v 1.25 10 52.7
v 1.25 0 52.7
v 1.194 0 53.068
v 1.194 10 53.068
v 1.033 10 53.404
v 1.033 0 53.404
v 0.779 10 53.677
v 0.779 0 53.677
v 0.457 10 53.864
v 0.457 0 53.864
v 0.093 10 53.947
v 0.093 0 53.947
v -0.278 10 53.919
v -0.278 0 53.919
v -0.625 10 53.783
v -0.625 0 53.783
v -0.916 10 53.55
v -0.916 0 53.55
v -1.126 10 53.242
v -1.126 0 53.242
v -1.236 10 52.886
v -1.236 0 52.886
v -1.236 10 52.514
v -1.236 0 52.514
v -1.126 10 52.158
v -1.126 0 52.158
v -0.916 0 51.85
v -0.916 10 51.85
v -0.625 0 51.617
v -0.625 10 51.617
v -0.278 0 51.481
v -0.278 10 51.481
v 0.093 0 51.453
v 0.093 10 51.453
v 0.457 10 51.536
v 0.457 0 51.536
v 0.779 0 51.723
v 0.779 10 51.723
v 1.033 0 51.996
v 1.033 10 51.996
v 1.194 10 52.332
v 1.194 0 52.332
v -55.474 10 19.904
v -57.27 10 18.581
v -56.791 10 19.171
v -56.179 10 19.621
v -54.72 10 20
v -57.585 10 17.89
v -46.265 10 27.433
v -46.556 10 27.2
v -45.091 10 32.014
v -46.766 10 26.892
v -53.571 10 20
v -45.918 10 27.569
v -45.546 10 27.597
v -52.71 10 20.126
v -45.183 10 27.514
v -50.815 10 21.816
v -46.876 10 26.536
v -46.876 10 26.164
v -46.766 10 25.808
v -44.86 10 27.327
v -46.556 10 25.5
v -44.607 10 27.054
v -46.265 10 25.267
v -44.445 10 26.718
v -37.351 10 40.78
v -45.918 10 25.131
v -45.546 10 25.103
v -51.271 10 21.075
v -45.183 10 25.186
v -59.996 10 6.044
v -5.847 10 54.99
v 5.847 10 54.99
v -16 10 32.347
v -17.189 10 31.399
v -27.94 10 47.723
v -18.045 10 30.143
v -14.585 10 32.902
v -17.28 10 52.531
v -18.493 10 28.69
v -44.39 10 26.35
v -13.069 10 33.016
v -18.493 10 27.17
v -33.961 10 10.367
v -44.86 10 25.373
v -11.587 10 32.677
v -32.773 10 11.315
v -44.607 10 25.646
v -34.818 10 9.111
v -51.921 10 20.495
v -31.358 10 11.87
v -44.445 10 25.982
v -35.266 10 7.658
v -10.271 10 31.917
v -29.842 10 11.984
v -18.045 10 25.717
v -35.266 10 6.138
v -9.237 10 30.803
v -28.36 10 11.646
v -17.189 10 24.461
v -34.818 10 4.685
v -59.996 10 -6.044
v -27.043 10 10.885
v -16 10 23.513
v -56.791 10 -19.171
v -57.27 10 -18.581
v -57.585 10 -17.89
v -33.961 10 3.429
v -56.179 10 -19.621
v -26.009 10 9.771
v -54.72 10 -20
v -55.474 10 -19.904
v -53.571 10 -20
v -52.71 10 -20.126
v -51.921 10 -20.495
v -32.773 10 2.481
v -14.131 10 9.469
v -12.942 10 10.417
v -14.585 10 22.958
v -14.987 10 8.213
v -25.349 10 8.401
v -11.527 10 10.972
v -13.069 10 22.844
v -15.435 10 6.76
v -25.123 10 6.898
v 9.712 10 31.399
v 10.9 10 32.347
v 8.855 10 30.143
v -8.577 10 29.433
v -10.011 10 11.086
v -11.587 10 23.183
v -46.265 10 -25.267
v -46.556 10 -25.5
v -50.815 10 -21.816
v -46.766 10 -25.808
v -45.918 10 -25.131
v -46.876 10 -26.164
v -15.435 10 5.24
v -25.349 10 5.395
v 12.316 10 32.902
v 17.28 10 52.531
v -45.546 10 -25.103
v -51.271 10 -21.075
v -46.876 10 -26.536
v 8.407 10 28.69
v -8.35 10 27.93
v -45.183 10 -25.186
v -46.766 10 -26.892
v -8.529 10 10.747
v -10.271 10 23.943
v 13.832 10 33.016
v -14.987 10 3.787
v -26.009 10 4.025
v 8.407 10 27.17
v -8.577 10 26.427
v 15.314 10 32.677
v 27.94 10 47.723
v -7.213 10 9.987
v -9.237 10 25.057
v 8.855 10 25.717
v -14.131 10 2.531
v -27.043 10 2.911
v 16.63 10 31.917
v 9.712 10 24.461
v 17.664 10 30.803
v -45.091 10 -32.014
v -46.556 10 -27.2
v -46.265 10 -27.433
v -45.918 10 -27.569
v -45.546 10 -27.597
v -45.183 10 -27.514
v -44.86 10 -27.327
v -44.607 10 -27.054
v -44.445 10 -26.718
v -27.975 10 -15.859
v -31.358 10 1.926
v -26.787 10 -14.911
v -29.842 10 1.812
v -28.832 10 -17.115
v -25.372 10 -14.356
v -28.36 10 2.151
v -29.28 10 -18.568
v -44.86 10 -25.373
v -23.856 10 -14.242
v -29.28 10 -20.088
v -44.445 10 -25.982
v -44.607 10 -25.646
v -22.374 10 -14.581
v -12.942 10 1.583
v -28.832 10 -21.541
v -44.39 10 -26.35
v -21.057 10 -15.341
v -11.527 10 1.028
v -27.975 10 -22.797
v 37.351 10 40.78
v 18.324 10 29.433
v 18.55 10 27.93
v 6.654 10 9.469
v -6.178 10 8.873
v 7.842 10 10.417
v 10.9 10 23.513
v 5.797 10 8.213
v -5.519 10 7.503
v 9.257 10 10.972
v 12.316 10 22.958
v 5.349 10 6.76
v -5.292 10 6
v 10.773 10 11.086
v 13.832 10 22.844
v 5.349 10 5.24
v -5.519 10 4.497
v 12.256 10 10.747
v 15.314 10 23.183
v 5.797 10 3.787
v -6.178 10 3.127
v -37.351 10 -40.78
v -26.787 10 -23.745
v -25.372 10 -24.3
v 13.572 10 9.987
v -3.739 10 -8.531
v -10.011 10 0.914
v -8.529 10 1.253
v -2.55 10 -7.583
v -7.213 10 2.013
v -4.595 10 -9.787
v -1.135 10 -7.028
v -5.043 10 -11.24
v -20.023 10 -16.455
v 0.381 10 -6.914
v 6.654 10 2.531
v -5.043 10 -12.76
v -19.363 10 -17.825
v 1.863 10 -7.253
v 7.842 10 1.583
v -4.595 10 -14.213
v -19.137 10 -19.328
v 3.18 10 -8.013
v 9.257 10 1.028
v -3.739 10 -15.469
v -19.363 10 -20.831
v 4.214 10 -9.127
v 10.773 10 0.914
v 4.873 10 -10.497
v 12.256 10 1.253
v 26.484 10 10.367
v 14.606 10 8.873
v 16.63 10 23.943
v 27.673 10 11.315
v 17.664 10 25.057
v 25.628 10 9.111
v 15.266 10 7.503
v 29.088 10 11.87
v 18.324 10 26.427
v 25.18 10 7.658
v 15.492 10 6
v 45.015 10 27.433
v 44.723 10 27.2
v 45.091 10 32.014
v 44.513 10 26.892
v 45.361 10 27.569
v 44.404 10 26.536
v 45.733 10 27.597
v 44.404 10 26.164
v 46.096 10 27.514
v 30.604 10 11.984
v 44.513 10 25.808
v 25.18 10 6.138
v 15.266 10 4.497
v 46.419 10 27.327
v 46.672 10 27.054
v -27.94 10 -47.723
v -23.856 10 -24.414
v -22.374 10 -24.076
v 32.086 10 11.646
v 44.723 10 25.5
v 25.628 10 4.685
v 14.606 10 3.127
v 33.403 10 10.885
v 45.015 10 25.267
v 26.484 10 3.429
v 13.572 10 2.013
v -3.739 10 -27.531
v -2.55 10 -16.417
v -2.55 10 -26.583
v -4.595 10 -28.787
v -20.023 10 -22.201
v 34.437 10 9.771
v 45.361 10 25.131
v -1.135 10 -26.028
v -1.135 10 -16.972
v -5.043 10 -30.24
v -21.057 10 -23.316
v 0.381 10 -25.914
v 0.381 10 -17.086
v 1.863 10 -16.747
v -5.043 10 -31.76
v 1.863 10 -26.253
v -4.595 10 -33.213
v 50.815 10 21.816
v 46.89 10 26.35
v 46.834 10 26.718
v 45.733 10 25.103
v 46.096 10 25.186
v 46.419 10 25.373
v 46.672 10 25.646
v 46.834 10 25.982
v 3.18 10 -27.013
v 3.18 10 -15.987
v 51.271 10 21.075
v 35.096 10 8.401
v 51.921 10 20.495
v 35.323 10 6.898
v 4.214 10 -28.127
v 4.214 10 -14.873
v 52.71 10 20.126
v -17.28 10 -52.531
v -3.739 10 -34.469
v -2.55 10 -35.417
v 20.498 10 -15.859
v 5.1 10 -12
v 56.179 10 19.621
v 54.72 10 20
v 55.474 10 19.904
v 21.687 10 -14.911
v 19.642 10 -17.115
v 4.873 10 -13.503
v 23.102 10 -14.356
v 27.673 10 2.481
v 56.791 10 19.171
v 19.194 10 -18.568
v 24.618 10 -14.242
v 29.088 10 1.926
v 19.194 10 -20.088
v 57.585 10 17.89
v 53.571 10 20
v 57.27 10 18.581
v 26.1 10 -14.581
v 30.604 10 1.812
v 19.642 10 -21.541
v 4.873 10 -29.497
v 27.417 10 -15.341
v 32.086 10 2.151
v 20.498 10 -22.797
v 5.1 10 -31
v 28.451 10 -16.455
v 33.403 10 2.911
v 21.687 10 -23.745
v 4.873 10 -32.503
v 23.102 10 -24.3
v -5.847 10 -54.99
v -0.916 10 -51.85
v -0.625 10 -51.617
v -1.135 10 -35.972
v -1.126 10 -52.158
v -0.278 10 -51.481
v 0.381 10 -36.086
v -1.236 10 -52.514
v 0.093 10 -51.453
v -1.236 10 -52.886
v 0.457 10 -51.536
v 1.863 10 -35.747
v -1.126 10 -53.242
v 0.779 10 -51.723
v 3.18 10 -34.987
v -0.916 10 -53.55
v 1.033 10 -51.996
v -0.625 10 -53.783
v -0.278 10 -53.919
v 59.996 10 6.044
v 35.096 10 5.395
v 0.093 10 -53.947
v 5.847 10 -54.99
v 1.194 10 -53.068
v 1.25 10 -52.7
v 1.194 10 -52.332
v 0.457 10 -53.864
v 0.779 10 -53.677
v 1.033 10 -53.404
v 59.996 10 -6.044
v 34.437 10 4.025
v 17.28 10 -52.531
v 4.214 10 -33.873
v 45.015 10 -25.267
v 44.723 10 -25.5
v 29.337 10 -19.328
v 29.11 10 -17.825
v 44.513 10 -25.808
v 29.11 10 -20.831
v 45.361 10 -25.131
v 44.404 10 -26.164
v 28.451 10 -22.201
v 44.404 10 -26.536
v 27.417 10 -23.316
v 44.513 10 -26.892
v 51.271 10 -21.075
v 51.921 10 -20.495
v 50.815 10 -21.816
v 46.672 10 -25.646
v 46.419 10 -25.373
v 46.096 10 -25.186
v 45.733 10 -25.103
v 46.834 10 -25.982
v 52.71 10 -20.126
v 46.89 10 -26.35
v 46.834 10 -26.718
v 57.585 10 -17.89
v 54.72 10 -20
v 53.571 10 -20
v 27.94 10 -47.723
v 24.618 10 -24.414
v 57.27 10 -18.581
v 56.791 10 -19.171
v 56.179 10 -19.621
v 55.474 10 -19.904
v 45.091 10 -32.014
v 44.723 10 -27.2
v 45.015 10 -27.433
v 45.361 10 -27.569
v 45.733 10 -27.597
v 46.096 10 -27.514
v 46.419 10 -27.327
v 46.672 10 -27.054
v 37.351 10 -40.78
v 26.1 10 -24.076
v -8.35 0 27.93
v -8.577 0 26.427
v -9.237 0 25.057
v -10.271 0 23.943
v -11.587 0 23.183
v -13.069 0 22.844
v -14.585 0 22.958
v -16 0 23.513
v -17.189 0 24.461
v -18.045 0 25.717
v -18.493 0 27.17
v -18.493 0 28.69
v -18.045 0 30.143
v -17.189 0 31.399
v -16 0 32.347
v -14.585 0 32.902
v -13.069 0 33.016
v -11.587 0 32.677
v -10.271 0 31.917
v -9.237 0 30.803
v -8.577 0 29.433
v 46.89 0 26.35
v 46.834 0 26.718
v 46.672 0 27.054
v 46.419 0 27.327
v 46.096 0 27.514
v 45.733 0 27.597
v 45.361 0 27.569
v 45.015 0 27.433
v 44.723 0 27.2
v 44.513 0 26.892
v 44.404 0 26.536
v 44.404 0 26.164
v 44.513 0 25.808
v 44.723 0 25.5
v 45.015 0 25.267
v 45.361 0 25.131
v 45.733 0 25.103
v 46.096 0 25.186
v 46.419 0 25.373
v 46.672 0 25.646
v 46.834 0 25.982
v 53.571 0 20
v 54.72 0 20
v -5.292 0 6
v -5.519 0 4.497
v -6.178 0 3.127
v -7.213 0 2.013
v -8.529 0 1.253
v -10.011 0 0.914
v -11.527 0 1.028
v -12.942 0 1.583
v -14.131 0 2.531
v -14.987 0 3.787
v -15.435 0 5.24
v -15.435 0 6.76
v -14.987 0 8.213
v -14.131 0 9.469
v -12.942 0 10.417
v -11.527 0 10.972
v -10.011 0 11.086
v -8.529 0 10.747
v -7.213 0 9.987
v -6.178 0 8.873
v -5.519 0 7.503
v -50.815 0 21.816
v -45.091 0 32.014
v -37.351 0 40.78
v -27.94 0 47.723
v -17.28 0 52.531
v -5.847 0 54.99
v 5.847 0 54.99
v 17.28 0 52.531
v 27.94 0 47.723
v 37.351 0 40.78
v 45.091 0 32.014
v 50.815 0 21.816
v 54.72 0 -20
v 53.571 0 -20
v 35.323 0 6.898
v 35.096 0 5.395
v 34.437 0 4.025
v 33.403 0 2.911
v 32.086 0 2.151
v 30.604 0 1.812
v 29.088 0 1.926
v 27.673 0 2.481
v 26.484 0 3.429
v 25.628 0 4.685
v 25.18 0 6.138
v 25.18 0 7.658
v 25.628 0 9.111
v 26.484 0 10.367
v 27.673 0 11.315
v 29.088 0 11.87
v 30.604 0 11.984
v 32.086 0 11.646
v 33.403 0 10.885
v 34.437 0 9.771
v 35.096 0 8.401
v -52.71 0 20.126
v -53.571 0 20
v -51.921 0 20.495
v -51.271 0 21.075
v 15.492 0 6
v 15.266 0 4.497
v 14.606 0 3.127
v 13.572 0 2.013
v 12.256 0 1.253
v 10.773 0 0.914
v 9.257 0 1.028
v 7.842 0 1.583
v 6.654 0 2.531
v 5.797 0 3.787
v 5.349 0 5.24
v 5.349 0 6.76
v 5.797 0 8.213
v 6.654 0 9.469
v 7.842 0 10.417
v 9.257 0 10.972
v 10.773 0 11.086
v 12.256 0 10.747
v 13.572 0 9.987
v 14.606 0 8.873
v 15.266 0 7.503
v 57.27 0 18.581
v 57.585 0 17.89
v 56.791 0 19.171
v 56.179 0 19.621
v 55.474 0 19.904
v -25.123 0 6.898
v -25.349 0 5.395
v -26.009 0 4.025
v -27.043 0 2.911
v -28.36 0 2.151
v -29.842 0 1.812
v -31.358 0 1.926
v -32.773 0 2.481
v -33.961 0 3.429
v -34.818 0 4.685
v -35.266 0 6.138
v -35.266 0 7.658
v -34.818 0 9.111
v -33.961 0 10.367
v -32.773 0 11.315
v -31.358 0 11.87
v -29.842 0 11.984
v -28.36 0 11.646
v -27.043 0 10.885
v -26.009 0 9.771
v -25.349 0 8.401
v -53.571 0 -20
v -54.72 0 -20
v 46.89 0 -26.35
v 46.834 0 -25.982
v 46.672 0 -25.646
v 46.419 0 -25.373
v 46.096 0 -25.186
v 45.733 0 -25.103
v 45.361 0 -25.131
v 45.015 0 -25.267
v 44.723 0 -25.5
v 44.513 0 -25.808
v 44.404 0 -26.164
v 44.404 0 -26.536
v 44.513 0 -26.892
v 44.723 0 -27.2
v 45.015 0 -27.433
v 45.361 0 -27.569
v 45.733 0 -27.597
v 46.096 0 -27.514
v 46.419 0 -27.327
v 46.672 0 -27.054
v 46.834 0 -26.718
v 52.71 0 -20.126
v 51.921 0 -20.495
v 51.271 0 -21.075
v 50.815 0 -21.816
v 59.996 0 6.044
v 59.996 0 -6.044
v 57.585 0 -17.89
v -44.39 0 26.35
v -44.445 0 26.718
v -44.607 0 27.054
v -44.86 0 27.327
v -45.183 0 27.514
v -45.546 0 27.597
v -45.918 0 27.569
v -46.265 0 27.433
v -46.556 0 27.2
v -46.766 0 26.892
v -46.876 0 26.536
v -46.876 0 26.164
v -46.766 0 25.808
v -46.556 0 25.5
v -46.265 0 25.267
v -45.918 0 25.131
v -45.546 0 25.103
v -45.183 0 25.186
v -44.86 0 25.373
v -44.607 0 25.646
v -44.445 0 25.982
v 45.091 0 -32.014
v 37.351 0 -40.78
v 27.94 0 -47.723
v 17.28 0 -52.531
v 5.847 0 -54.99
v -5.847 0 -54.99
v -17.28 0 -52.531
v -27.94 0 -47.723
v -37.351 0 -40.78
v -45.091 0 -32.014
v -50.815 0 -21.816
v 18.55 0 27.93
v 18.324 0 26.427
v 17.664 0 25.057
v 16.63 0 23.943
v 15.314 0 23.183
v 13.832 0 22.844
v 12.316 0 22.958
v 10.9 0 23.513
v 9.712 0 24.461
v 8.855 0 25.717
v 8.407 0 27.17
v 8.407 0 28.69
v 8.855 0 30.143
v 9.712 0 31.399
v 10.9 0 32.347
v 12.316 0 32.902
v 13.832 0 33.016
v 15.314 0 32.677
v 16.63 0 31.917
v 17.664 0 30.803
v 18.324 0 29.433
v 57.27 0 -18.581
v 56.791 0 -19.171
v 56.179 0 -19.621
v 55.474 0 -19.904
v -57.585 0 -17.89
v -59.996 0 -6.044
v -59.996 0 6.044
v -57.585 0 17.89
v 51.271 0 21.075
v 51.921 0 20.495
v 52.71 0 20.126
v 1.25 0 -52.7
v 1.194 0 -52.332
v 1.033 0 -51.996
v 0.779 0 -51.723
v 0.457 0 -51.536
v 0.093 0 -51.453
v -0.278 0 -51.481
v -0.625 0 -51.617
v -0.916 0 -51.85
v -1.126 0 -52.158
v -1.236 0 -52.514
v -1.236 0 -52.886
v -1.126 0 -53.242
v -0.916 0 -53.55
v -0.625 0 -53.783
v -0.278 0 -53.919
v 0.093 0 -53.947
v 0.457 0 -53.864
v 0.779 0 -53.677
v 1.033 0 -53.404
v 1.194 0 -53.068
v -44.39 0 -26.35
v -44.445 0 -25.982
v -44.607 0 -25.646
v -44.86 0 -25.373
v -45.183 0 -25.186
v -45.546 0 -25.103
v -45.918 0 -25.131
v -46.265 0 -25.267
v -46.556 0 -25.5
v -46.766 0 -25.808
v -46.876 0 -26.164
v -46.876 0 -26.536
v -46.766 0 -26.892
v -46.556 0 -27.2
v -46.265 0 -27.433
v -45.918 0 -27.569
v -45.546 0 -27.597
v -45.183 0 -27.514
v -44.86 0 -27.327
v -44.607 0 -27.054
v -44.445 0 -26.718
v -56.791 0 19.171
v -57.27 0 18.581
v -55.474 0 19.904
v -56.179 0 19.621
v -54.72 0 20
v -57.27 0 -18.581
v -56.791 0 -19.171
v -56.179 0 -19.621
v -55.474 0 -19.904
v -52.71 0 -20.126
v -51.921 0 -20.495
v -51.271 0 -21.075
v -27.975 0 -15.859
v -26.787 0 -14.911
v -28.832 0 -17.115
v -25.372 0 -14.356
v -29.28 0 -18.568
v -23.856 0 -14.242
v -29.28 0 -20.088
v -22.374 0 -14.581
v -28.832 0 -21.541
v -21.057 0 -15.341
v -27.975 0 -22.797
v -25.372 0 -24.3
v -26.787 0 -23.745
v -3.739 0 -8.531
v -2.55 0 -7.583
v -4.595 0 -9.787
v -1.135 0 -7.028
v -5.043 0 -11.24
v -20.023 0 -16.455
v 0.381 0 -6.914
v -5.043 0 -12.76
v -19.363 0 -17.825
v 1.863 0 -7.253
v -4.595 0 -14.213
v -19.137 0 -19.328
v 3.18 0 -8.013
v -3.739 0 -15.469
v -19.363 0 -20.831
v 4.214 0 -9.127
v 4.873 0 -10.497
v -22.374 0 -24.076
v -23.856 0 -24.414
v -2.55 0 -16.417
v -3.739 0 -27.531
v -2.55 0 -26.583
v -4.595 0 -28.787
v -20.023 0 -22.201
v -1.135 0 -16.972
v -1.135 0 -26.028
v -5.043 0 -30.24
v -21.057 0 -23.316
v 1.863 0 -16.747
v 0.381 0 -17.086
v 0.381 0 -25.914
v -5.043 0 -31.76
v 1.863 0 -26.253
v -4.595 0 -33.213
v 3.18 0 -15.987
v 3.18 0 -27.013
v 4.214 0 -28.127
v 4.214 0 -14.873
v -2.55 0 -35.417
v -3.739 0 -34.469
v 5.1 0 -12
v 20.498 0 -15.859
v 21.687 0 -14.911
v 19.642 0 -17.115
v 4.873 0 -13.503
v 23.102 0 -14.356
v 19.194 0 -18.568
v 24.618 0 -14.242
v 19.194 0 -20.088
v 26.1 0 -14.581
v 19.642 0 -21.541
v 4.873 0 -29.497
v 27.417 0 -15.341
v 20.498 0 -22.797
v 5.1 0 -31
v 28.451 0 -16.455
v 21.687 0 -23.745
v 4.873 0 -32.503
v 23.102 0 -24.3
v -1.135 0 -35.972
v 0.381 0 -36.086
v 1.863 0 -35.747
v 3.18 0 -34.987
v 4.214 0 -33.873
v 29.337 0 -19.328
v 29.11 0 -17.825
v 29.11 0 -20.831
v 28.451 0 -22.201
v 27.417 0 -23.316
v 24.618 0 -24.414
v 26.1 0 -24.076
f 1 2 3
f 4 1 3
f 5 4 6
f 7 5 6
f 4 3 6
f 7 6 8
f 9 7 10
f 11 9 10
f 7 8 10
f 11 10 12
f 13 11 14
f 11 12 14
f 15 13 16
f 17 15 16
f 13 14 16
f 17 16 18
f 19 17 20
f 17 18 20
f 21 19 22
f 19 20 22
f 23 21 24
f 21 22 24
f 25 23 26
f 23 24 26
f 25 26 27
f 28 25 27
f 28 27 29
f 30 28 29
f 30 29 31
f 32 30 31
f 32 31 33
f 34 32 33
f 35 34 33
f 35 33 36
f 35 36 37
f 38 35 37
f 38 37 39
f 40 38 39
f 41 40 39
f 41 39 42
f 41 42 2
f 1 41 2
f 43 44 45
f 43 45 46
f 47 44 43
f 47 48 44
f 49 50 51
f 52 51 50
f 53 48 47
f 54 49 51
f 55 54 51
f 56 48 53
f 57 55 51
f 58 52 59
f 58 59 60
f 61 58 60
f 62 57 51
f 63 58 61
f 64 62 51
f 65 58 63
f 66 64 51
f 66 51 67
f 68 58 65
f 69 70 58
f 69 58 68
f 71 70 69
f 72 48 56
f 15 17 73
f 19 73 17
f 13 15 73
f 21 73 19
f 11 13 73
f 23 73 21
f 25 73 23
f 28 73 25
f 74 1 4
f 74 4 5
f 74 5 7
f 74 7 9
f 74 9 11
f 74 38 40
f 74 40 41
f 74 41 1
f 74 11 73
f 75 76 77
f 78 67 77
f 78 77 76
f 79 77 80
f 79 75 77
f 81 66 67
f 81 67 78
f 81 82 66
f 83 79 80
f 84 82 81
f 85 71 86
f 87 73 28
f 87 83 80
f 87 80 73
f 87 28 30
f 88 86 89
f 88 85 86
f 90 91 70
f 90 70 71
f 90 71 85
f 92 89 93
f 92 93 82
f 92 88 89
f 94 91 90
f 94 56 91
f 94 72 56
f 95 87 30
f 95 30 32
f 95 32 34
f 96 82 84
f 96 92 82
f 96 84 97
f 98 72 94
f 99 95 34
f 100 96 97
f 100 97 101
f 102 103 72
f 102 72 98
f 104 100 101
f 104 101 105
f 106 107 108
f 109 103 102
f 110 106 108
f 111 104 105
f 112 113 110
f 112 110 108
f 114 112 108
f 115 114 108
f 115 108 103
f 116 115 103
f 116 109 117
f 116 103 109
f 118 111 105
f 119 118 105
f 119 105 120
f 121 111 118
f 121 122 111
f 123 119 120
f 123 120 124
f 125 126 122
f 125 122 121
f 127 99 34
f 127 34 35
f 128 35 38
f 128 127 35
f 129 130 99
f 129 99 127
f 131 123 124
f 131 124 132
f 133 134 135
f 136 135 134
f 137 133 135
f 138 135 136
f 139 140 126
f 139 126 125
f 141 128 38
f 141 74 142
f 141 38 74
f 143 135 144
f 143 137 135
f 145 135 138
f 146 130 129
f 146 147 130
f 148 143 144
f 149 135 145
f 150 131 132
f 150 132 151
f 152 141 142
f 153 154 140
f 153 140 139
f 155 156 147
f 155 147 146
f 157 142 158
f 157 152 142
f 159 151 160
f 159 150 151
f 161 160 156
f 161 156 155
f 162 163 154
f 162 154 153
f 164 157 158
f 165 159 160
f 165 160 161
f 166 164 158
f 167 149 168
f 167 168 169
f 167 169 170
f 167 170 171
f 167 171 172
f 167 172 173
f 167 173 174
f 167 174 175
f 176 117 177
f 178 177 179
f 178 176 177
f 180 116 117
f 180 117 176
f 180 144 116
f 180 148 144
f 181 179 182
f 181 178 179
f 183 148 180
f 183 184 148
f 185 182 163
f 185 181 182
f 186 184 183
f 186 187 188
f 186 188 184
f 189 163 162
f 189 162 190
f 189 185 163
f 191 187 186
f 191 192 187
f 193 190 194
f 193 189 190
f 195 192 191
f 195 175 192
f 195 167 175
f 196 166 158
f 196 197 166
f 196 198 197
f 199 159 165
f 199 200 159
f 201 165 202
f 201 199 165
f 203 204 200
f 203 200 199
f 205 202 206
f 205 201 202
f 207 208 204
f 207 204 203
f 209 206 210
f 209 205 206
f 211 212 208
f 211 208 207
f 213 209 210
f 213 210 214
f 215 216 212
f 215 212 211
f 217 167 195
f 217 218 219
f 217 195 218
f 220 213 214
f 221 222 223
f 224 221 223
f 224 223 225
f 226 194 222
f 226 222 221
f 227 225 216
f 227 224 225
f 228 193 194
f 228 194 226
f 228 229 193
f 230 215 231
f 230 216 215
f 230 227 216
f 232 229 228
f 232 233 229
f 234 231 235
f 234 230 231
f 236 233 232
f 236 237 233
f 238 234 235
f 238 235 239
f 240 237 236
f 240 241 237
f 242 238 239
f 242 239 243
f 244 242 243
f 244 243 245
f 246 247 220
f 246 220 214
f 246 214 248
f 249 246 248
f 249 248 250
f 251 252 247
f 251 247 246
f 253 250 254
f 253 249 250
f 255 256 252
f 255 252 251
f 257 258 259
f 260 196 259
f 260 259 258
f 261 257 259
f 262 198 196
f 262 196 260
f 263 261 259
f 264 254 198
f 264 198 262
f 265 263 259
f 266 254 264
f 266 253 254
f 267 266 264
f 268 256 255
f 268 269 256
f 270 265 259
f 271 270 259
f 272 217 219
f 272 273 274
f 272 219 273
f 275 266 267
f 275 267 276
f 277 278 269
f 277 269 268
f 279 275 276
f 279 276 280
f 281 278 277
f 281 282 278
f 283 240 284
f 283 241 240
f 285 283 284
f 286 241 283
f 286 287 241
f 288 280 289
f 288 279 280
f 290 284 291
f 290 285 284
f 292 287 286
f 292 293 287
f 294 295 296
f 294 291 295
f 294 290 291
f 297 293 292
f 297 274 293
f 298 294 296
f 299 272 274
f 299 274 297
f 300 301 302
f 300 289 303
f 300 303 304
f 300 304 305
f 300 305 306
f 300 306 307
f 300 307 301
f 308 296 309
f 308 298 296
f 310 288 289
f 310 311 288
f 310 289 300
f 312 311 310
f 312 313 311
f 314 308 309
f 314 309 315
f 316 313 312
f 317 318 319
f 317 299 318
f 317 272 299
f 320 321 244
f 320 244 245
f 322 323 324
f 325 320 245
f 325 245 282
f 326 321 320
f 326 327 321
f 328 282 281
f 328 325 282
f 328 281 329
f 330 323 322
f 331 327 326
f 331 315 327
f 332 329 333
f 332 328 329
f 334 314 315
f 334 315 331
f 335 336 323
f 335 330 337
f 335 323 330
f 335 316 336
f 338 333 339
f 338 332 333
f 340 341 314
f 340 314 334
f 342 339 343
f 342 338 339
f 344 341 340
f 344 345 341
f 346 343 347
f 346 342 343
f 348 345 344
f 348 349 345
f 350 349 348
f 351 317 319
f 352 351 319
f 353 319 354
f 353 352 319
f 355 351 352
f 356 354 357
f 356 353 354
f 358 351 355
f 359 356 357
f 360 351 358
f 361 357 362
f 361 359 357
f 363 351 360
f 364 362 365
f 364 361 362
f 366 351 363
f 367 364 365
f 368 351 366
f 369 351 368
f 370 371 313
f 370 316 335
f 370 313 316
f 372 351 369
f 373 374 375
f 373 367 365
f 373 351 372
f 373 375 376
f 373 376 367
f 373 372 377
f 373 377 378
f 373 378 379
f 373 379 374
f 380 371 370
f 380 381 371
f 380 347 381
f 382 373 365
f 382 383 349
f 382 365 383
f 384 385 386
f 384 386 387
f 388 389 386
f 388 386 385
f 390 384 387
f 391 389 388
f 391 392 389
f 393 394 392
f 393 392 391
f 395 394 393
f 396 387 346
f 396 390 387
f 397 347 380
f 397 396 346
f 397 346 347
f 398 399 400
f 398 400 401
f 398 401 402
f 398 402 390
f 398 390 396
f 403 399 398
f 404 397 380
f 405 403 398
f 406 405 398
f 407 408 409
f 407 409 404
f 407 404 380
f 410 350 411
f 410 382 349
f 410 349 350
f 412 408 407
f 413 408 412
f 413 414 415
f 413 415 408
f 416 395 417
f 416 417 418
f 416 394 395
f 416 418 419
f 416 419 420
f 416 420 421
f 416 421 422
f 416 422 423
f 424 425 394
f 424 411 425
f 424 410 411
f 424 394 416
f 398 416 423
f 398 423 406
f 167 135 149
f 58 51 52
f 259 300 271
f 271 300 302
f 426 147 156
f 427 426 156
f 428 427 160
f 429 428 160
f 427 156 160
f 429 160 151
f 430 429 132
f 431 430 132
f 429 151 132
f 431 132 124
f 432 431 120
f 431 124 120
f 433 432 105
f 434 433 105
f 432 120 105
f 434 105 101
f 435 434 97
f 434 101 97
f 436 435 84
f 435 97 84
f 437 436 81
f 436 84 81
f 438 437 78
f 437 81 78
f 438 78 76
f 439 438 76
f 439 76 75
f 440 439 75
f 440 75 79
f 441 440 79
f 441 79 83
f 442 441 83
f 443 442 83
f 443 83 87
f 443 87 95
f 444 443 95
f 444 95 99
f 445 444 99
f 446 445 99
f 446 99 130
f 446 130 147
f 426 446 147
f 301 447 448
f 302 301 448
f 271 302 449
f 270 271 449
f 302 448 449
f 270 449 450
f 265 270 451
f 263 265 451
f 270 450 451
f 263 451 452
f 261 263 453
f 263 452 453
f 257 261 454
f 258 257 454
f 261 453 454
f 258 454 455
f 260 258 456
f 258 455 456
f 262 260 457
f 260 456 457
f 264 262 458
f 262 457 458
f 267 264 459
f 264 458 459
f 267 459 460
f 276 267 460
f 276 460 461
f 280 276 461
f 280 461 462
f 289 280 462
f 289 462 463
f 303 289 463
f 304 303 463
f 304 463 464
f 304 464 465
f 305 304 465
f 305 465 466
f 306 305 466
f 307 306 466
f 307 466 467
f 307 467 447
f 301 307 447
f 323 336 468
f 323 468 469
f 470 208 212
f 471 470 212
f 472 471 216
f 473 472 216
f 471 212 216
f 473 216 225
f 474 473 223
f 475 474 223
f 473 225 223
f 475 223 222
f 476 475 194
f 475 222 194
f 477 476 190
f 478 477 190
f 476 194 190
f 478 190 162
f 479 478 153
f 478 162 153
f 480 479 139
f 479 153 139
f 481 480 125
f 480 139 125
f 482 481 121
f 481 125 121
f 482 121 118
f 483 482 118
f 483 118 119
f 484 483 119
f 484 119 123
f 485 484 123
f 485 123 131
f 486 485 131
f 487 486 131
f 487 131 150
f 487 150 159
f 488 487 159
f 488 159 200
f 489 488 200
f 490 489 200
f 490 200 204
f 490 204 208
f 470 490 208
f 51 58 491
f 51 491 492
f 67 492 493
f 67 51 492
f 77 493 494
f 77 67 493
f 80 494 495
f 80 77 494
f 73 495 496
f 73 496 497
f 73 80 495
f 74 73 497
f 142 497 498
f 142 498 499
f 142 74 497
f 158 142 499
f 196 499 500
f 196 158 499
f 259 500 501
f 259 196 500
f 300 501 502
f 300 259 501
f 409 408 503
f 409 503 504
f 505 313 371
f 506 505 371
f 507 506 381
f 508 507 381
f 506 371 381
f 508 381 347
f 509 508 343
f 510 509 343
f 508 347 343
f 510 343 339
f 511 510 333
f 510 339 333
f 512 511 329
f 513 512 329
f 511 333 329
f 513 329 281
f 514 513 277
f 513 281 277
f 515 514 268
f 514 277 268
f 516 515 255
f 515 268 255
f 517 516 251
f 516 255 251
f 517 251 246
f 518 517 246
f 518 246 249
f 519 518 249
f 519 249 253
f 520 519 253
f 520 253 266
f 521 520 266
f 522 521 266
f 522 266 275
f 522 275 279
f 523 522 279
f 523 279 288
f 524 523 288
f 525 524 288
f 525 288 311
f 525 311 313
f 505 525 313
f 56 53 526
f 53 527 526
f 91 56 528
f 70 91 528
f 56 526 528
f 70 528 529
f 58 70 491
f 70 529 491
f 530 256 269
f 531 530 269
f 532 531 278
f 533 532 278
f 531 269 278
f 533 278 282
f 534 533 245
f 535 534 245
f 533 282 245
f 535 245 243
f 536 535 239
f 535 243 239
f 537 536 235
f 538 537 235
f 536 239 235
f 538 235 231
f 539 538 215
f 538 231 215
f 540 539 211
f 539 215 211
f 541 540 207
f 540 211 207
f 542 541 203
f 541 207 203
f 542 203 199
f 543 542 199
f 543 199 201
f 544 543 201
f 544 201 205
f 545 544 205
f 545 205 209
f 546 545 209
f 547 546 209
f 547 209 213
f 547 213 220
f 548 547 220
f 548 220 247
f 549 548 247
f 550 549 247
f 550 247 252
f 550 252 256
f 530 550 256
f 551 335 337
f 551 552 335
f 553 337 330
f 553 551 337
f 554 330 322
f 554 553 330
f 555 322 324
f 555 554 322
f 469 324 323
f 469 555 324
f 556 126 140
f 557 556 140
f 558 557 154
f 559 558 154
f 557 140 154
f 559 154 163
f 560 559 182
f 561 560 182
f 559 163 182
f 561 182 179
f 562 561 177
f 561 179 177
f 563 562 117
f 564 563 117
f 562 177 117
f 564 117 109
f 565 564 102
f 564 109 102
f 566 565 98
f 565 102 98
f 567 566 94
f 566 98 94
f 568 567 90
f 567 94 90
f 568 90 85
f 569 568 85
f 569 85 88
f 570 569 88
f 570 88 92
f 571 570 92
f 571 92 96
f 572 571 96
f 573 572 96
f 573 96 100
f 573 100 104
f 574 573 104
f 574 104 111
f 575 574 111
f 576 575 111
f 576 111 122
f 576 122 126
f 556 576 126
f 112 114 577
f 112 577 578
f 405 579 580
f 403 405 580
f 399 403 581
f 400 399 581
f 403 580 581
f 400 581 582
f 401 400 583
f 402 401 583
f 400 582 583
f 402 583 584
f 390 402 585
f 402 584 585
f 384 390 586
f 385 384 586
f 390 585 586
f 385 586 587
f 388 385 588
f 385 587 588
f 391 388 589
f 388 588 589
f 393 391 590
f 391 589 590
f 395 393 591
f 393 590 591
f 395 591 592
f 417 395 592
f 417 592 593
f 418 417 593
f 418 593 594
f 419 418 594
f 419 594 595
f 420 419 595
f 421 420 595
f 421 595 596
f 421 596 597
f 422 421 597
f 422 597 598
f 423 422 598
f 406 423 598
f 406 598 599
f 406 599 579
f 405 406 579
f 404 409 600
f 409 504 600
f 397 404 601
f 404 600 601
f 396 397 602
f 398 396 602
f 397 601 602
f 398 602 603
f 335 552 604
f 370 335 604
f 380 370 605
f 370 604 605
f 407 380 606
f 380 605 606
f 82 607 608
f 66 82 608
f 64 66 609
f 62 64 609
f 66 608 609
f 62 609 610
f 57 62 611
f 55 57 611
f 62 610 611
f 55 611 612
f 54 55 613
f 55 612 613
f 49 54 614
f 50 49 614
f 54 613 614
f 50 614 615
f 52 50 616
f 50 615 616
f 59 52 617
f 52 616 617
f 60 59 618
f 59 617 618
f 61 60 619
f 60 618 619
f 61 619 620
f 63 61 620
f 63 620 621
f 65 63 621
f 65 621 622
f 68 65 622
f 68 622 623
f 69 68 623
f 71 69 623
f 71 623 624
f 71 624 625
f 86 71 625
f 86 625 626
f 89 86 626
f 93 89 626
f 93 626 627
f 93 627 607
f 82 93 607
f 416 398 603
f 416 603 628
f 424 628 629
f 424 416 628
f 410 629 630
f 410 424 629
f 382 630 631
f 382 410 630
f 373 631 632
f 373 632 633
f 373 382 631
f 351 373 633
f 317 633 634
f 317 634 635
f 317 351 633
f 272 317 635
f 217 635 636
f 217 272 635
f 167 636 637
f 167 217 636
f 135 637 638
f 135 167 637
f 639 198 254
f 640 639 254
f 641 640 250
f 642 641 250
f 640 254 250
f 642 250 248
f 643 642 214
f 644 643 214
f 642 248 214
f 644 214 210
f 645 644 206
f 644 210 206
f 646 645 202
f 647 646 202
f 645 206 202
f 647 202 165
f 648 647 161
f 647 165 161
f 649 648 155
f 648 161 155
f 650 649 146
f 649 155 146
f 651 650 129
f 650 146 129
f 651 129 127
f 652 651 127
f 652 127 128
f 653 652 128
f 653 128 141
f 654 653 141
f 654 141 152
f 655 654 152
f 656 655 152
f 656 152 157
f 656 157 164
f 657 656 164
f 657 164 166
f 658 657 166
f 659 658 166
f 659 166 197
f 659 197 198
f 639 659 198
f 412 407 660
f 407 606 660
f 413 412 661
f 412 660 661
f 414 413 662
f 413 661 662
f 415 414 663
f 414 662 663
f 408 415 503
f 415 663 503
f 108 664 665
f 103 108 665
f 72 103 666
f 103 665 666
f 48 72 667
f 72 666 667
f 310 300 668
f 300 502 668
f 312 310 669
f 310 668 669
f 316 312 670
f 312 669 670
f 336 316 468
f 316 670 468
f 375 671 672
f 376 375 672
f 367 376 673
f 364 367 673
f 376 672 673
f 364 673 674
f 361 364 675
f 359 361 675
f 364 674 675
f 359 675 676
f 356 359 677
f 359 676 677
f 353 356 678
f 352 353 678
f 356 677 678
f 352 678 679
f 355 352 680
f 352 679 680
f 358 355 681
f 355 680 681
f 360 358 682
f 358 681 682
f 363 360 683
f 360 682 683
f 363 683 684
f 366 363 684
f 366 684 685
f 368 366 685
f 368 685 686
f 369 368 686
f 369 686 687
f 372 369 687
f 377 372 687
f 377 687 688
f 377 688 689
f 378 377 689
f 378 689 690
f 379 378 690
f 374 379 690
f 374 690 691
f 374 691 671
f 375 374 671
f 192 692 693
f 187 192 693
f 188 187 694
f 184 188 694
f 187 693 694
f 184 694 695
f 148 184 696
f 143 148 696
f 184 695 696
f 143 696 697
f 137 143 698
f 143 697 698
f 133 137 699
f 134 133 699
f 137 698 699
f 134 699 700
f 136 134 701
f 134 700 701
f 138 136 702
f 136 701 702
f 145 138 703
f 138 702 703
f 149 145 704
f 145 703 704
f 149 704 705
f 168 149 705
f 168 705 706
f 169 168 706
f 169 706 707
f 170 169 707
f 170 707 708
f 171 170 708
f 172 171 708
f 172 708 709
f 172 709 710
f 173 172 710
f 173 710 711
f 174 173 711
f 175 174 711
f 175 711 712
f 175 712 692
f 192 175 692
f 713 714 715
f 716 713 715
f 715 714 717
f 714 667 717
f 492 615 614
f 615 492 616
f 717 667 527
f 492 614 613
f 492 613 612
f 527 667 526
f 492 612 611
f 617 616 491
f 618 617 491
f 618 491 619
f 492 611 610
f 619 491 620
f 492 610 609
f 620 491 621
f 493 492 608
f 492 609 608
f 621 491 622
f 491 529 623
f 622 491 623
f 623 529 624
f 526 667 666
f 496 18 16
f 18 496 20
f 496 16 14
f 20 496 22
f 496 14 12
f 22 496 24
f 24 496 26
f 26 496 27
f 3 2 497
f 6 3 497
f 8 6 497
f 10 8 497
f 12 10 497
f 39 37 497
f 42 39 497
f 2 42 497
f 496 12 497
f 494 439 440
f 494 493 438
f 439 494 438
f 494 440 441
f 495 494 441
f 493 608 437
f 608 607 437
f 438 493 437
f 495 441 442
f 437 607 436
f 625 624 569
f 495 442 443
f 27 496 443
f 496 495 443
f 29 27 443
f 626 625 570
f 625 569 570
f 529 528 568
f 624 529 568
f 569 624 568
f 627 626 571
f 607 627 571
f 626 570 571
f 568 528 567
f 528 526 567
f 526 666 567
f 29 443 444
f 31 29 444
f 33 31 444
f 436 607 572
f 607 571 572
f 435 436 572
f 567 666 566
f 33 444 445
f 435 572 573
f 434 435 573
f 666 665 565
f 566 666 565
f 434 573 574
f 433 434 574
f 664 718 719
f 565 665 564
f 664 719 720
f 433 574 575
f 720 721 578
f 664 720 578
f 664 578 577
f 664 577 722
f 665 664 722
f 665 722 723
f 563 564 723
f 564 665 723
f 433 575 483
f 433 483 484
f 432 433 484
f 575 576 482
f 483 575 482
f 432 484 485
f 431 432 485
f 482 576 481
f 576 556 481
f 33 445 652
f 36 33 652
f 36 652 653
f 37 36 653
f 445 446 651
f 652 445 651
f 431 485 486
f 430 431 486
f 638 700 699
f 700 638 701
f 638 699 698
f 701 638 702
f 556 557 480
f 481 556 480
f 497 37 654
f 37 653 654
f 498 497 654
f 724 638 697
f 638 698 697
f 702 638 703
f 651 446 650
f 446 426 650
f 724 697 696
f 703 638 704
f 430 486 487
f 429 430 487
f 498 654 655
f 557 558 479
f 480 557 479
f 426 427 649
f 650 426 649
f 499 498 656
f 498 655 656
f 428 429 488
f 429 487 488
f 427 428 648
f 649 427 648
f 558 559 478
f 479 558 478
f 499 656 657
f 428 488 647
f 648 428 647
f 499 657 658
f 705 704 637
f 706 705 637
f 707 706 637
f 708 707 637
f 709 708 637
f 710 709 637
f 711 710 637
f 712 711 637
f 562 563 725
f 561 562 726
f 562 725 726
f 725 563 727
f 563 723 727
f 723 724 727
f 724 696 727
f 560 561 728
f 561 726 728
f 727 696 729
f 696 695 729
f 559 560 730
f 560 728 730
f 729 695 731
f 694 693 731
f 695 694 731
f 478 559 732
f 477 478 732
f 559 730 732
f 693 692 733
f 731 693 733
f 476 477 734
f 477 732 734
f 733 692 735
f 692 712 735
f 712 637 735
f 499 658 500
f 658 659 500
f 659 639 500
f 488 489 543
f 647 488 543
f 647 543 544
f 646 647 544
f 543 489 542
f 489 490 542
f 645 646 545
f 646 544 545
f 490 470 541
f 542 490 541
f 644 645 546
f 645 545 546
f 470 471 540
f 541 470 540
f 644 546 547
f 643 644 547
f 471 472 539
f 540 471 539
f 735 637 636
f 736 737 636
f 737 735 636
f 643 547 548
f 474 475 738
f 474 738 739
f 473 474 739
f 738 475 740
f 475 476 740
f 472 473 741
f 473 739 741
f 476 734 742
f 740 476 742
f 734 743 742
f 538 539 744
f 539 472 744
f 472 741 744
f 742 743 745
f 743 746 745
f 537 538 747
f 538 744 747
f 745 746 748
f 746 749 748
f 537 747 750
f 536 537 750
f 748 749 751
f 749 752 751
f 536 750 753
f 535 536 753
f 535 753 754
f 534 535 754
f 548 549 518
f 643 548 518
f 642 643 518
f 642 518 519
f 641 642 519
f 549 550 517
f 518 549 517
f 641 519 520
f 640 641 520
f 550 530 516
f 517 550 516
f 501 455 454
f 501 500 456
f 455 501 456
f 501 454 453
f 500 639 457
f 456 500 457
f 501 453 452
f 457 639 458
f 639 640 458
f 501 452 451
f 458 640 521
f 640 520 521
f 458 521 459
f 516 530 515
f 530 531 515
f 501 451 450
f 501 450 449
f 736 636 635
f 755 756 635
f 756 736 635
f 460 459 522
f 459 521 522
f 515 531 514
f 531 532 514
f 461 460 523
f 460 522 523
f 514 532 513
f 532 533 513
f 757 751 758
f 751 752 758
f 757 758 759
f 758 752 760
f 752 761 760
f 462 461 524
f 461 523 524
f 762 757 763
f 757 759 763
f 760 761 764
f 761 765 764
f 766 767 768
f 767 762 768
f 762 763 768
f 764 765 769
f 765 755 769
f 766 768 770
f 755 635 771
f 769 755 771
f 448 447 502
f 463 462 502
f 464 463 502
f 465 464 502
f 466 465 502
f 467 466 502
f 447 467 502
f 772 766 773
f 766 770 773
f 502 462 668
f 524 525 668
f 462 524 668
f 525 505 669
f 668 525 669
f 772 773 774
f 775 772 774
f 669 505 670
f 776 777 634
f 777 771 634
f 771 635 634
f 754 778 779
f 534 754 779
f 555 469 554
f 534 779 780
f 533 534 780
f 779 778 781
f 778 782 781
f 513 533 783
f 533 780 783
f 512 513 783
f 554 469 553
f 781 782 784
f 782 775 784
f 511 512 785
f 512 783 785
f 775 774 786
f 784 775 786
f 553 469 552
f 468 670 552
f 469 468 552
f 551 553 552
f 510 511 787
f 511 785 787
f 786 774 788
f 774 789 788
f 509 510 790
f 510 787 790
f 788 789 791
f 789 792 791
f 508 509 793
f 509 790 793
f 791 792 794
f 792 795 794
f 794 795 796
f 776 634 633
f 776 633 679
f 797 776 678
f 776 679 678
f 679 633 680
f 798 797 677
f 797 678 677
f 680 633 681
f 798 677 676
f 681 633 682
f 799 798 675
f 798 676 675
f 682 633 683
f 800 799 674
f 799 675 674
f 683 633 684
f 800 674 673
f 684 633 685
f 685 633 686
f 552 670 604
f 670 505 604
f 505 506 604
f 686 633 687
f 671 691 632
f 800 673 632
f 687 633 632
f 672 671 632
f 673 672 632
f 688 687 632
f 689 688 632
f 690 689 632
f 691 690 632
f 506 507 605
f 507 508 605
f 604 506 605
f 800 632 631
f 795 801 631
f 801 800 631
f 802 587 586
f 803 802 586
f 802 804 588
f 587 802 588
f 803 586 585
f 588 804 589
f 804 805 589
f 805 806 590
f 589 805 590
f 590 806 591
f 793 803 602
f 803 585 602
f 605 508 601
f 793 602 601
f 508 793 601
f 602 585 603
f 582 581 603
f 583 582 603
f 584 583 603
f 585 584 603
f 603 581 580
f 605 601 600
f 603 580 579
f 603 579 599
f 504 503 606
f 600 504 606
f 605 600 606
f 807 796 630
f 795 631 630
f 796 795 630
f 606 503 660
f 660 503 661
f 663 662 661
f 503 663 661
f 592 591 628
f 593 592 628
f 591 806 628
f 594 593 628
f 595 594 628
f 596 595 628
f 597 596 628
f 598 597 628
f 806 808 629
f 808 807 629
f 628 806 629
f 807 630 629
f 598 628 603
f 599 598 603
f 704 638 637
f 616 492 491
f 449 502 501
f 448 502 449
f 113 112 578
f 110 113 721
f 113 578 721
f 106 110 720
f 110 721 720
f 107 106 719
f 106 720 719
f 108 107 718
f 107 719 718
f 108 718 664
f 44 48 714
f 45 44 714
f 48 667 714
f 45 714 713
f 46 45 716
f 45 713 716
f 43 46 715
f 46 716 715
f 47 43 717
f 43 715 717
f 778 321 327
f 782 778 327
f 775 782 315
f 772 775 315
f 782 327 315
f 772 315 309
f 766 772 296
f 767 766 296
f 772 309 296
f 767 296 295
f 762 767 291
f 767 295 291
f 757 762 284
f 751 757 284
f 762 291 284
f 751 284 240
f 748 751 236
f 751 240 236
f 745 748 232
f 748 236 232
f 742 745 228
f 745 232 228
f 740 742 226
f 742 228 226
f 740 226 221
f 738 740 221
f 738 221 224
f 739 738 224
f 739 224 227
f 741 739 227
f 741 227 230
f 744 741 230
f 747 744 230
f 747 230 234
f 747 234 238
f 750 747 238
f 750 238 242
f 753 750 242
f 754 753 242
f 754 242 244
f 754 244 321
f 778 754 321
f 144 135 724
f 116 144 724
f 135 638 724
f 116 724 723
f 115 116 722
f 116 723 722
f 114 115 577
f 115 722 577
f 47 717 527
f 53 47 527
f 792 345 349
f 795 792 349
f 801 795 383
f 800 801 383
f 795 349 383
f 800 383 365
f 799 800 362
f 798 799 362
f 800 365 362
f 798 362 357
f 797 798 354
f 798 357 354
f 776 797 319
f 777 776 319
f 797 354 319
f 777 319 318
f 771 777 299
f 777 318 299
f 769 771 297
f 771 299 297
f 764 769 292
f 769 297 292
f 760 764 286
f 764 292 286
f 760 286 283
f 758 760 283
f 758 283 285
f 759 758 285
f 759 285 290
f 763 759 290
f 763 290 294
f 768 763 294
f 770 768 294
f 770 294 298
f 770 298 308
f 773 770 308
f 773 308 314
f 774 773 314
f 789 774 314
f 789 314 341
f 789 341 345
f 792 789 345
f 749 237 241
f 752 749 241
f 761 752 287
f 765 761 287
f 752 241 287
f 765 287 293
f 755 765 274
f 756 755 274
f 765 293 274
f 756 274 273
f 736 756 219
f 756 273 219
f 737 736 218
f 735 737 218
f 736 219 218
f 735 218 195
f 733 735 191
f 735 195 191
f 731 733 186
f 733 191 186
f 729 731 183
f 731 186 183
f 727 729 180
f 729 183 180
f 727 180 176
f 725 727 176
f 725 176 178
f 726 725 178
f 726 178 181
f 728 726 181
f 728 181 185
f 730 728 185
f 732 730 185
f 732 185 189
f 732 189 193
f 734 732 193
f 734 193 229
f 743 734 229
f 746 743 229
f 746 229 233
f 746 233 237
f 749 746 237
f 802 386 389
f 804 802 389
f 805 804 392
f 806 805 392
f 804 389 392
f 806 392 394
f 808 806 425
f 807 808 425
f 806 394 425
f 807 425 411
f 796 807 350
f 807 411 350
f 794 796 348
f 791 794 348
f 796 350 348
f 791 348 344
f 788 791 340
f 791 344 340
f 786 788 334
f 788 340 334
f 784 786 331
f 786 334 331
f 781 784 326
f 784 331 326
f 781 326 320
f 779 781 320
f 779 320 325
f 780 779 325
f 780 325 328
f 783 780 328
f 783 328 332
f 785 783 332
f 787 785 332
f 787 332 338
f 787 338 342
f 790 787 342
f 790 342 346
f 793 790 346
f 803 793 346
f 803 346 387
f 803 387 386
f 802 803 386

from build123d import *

# Parameters (mm, degrees)
SKETCH_3_R          = 60.3
EXTRUDE_2_DEPTH     = 10
CUT_EXTRUDE_2_DEPTH = 11
FILLET_1_R          = 3
SKETCH_5_R          = 1.25
CUT_EXTRUDE_3_DEPTH = 11
SKETCH_6_R          = 5.1
CUT_EXTRUDE_4_DEPTH = 11
SKETCH_7_R          = 5.1
CUT_EXTRUDE_5_DEPTH = 11


with BuildPart() as part:
    # 草图3 → 凸台-拉伸2 (new body)
    with BuildSketch(Plane(origin=(0, 0, 0), x_dir=(1, 0, 0), z_dir=(0, 1, 0))):
        Circle(SKETCH_3_R)
    extrude(amount=EXTRUDE_2_DEPTH)

    # 草图4 → 切除-拉伸2 (cut, through all)
    with BuildSketch(Plane(origin=(0, 10, 0), x_dir=(1, 0, 0), z_dir=(0, 1, 0))):
        with BuildLine():
            Line((-51.556667852, 20), (-56.886641666, 20))
            ThreePointArc((-56.886641666, 20), (0, 60.3), (56.886641666, 20))
            Line((56.886641666, 20), (51.556667852, 20))
            ThreePointArc((51.556667852, 20), (0, 55.3), (-51.556667852, 20))
        make_face()
        with BuildLine():
            Line((-56.886641666, -20), (-51.556667852, -20))
            ThreePointArc((-51.556667852, -20), (0, -55.3), (51.556667852, -20))
            Line((51.556667852, -20), (56.886641666, -20))
            ThreePointArc((56.886641666, -20), (0, -60.3), (-56.886641666, -20))
        make_face()
    extrude(amount=-CUT_EXTRUDE_2_DEPTH, mode=Mode.SUBTRACT)

    # 圆角1
    fillet_1_edges = [part.edges().sort_by_distance(p)[0] for p in [
        (51.556667852, 5, -20),
        (-51.556667852, 5, -20),
        (-56.886641666, 5, -20),
        (56.886641666, 5, -20),
        (-51.556667852, 5, 20),
        (51.556667852, 5, 20),
        (56.886641666, 5, 20),
        (-56.886641666, 5, 20),
    ]]
    fillet(fillet_1_edges, radius=FILLET_1_R)

    # 草图5 → 切除-拉伸3 (cut, through all)
    with BuildSketch(Plane.XZ):
        with Locations((0, -52.7)):
            Circle(SKETCH_5_R)
        with Locations((-45.639538779, -26.35)):
            Circle(SKETCH_5_R)
        with Locations((-45.639538779, 26.35)):
            Circle(SKETCH_5_R)
        with Locations((0, 52.7)):
            Circle(SKETCH_5_R)
        with Locations((45.639538779, 26.35)):
            Circle(SKETCH_5_R)
        with Locations((45.639538779, -26.35)):
            Circle(SKETCH_5_R)
    extrude(amount=-CUT_EXTRUDE_3_DEPTH, mode=Mode.SUBTRACT)

    # 草图6 → 切除-拉伸4 (cut, through all)
    with BuildSketch(Plane(origin=(0, 10, 0), x_dir=(1, 0, 0), z_dir=(0, 1, 0))):
        with Locations((0, 31)):
            Circle(SKETCH_6_R)
        with Locations((24.236775957, 19.328183858)):
            Circle(SKETCH_6_R)
        with Locations((30.222765278, -6.898148953)):
            Circle(SKETCH_6_R)
        with Locations((13.450395913, -27.930034905)):
            Circle(SKETCH_6_R)
        with Locations((-13.450395913, -27.930034905)):
            Circle(SKETCH_6_R)
        with Locations((-30.222765278, -6.898148953)):
            Circle(SKETCH_6_R)
        with Locations((-24.236775957, 19.328183858)):
            Circle(SKETCH_6_R)
    extrude(amount=-CUT_EXTRUDE_4_DEPTH, mode=Mode.SUBTRACT)

    # 草图7 → 切除-拉伸5 (cut, through all)
    with BuildSketch(Plane(origin=(0, 10, 0), x_dir=(1, 0, 0), z_dir=(0, 1, 0))):
        with Locations((0, 12)):
            Circle(SKETCH_7_R)
        with Locations((10.392304845, -6)):
            Circle(SKETCH_7_R)
        with Locations((-10.392304845, -6)):
            Circle(SKETCH_7_R)
    extrude(amount=-CUT_EXTRUDE_5_DEPTH, mode=Mode.SUBTRACT)


solid = part.part
